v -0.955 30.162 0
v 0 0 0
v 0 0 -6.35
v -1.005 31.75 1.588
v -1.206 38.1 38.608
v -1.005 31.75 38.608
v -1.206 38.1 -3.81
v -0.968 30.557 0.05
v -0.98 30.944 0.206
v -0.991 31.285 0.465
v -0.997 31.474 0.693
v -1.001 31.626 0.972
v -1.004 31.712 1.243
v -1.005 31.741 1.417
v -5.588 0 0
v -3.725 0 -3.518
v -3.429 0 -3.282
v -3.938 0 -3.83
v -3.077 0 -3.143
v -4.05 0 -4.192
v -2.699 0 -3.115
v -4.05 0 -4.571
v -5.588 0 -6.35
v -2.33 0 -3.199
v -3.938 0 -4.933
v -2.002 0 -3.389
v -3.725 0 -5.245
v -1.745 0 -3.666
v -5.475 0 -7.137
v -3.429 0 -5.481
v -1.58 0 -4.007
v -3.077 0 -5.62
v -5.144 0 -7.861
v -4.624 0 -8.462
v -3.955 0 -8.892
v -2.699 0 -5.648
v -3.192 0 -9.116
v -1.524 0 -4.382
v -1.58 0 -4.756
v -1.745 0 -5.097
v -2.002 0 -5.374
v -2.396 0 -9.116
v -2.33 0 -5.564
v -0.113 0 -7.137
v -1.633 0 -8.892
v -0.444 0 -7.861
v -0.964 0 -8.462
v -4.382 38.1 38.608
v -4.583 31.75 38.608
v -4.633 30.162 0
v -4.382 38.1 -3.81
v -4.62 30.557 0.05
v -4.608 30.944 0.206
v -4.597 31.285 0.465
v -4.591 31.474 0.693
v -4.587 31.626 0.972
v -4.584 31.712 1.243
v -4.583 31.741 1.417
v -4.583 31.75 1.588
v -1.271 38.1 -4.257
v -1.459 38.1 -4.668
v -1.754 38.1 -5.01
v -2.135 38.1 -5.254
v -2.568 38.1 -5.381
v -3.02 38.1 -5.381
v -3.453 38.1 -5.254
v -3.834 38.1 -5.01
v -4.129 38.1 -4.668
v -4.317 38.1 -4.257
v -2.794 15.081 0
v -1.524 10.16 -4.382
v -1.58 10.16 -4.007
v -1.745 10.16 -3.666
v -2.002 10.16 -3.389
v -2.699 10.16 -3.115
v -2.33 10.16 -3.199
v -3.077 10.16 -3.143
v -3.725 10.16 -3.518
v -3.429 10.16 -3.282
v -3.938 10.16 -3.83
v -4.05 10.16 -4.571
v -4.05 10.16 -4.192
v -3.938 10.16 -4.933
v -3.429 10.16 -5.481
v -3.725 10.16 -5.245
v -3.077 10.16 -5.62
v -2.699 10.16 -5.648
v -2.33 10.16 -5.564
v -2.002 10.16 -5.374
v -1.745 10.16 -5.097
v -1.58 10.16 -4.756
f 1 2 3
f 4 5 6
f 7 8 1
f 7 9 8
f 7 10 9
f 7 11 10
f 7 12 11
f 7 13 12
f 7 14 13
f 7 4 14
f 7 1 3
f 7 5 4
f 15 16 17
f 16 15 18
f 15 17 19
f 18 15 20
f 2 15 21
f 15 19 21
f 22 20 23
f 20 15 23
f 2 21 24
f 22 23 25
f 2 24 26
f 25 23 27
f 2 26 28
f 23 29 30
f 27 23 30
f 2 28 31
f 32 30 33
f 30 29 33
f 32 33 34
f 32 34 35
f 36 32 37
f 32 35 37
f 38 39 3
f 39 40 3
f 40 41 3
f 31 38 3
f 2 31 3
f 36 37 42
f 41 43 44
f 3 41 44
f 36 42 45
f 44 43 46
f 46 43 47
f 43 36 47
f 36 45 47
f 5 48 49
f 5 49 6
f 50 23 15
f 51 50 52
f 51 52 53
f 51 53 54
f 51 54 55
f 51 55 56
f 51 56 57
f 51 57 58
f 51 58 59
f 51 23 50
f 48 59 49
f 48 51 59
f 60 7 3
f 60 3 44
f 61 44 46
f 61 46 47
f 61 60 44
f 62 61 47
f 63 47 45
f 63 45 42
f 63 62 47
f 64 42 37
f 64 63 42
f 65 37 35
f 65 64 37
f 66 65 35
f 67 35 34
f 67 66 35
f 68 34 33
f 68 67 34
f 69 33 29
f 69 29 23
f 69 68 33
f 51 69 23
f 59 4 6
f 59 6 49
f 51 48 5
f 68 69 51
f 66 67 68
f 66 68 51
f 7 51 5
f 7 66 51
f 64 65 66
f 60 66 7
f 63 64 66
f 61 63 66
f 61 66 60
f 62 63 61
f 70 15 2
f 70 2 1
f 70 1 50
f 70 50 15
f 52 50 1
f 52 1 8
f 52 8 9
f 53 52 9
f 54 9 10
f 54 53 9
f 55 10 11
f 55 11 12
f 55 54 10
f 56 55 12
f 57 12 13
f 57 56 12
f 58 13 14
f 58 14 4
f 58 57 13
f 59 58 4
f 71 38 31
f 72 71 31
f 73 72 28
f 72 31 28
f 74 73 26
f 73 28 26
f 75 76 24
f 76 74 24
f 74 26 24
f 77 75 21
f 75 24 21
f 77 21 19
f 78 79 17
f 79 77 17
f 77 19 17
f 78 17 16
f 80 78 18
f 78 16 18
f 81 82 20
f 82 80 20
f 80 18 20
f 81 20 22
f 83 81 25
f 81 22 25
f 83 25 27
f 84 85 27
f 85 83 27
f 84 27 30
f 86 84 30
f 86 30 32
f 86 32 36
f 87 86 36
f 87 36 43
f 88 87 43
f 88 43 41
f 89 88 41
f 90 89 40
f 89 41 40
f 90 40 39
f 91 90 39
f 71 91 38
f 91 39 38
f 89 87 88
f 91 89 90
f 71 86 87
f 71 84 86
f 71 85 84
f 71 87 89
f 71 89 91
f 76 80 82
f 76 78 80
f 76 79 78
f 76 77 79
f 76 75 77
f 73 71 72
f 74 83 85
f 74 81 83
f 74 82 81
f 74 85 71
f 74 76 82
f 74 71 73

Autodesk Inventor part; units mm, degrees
ref_plane "YZ Plane" through (0, 0, 0) normal (1, 0, 0) x (0, 1, 0)
ref_plane "XY Plane" through (0, 0, 0) normal (0, 0, 1) x (1, 0, 0)
sketch "Sketch6" plane through (0, 0, 0) normal (0, 1, 0) x (-1, 0, 0)
  line L0 (0, 0) -> (5.588, 0)
  line L1 (5.588, 0) -> (5.588, -6.35)
  line L2 (5.588, -6.35) -> (0, -6.35)
  line L3 (0, -6.35) -> (0, 0)
  arc A0 (0, -6.35) -> (5.588, -6.35) centre (2.794, -6.35) ccw
  dimension "d25" = 5.588
  dimension "d26" = 6.35
ref_plane "Work Plane1" through (0, 38.1, 0) normal (0, 1, 0) x (-1, 0, 0)
sketch "Sketch8" plane through (0, 38.1, 0) normal (0, 1, 0) x (-1, 0, 0)
  line L0 (4.3815, 0) -> (1.2065, 0)
  line L1 (1.2065, 0) -> (1.2065, -3.81)
  line L2 (1.2065, -3.81) -> (4.3815, -3.81)
  line L3 (4.3815, -3.81) -> (4.3815, 0)
  arc A0 (1.2065, -3.81) -> (4.3815, -3.81) centre (2.794, -3.81) ccw
  point P0 (0, 0)
  dimension "d27" = 3.175
  dimension "d28" = 3.81
  dimension "d49" = 1.2065
loft "Loft1" add profiles "Sketch6", "Sketch8"
sketch "Sketch9" plane through (-5.588, 0, 0) normal (0, 0, 1) x (1, 0, 0)
  line L0 (0, 0) -> (5.588, 0) projected
  line L1 (5.588, 0) -> (4.3815, 38.1) projected
  line L2 (1.2065, 38.1) -> (4.3815, 38.1) projected
  line L3 (0, 0) -> (1.2065, 38.1) projected
  line L4 (4.3815, 38.1) -> (5.588, 0) projected
  line L5 (4.5826, 31.75) -> (1.0054, 31.75)
  line L6 (0, 0) -> (1.2065, 38.1) projected
  dimension "d34" = 6.35
extrude "Extrusion5" add sketch "Sketch9" along normal blind 38.608 contours L3 L2 L1 L5
fillet "Fillet2" radius 1.5875 1 edges at (-2.794, 31.75, 0)
sketch "Sketch12" plane through (-2.794, 0, -6.35) normal (0, -1, 0) x (1, 0, 0)
  circle A0 centre (0, 1.9685) radius 1.27
  arc A1 (-2.794, 0) -> (2.794, 0) centre (0, 0) ccw projected
  line L0 (0, -2.794) -> (0, 1.9685)
  point P0 (2.794, 6.35)
  dimension "d44" = 2.54
  dimension "d46" = 4.7625
extrude "Extrusion8" cut sketch "Sketch12" against normal blind 10.16
properties part number "RudderStabilizingFinBottom"
